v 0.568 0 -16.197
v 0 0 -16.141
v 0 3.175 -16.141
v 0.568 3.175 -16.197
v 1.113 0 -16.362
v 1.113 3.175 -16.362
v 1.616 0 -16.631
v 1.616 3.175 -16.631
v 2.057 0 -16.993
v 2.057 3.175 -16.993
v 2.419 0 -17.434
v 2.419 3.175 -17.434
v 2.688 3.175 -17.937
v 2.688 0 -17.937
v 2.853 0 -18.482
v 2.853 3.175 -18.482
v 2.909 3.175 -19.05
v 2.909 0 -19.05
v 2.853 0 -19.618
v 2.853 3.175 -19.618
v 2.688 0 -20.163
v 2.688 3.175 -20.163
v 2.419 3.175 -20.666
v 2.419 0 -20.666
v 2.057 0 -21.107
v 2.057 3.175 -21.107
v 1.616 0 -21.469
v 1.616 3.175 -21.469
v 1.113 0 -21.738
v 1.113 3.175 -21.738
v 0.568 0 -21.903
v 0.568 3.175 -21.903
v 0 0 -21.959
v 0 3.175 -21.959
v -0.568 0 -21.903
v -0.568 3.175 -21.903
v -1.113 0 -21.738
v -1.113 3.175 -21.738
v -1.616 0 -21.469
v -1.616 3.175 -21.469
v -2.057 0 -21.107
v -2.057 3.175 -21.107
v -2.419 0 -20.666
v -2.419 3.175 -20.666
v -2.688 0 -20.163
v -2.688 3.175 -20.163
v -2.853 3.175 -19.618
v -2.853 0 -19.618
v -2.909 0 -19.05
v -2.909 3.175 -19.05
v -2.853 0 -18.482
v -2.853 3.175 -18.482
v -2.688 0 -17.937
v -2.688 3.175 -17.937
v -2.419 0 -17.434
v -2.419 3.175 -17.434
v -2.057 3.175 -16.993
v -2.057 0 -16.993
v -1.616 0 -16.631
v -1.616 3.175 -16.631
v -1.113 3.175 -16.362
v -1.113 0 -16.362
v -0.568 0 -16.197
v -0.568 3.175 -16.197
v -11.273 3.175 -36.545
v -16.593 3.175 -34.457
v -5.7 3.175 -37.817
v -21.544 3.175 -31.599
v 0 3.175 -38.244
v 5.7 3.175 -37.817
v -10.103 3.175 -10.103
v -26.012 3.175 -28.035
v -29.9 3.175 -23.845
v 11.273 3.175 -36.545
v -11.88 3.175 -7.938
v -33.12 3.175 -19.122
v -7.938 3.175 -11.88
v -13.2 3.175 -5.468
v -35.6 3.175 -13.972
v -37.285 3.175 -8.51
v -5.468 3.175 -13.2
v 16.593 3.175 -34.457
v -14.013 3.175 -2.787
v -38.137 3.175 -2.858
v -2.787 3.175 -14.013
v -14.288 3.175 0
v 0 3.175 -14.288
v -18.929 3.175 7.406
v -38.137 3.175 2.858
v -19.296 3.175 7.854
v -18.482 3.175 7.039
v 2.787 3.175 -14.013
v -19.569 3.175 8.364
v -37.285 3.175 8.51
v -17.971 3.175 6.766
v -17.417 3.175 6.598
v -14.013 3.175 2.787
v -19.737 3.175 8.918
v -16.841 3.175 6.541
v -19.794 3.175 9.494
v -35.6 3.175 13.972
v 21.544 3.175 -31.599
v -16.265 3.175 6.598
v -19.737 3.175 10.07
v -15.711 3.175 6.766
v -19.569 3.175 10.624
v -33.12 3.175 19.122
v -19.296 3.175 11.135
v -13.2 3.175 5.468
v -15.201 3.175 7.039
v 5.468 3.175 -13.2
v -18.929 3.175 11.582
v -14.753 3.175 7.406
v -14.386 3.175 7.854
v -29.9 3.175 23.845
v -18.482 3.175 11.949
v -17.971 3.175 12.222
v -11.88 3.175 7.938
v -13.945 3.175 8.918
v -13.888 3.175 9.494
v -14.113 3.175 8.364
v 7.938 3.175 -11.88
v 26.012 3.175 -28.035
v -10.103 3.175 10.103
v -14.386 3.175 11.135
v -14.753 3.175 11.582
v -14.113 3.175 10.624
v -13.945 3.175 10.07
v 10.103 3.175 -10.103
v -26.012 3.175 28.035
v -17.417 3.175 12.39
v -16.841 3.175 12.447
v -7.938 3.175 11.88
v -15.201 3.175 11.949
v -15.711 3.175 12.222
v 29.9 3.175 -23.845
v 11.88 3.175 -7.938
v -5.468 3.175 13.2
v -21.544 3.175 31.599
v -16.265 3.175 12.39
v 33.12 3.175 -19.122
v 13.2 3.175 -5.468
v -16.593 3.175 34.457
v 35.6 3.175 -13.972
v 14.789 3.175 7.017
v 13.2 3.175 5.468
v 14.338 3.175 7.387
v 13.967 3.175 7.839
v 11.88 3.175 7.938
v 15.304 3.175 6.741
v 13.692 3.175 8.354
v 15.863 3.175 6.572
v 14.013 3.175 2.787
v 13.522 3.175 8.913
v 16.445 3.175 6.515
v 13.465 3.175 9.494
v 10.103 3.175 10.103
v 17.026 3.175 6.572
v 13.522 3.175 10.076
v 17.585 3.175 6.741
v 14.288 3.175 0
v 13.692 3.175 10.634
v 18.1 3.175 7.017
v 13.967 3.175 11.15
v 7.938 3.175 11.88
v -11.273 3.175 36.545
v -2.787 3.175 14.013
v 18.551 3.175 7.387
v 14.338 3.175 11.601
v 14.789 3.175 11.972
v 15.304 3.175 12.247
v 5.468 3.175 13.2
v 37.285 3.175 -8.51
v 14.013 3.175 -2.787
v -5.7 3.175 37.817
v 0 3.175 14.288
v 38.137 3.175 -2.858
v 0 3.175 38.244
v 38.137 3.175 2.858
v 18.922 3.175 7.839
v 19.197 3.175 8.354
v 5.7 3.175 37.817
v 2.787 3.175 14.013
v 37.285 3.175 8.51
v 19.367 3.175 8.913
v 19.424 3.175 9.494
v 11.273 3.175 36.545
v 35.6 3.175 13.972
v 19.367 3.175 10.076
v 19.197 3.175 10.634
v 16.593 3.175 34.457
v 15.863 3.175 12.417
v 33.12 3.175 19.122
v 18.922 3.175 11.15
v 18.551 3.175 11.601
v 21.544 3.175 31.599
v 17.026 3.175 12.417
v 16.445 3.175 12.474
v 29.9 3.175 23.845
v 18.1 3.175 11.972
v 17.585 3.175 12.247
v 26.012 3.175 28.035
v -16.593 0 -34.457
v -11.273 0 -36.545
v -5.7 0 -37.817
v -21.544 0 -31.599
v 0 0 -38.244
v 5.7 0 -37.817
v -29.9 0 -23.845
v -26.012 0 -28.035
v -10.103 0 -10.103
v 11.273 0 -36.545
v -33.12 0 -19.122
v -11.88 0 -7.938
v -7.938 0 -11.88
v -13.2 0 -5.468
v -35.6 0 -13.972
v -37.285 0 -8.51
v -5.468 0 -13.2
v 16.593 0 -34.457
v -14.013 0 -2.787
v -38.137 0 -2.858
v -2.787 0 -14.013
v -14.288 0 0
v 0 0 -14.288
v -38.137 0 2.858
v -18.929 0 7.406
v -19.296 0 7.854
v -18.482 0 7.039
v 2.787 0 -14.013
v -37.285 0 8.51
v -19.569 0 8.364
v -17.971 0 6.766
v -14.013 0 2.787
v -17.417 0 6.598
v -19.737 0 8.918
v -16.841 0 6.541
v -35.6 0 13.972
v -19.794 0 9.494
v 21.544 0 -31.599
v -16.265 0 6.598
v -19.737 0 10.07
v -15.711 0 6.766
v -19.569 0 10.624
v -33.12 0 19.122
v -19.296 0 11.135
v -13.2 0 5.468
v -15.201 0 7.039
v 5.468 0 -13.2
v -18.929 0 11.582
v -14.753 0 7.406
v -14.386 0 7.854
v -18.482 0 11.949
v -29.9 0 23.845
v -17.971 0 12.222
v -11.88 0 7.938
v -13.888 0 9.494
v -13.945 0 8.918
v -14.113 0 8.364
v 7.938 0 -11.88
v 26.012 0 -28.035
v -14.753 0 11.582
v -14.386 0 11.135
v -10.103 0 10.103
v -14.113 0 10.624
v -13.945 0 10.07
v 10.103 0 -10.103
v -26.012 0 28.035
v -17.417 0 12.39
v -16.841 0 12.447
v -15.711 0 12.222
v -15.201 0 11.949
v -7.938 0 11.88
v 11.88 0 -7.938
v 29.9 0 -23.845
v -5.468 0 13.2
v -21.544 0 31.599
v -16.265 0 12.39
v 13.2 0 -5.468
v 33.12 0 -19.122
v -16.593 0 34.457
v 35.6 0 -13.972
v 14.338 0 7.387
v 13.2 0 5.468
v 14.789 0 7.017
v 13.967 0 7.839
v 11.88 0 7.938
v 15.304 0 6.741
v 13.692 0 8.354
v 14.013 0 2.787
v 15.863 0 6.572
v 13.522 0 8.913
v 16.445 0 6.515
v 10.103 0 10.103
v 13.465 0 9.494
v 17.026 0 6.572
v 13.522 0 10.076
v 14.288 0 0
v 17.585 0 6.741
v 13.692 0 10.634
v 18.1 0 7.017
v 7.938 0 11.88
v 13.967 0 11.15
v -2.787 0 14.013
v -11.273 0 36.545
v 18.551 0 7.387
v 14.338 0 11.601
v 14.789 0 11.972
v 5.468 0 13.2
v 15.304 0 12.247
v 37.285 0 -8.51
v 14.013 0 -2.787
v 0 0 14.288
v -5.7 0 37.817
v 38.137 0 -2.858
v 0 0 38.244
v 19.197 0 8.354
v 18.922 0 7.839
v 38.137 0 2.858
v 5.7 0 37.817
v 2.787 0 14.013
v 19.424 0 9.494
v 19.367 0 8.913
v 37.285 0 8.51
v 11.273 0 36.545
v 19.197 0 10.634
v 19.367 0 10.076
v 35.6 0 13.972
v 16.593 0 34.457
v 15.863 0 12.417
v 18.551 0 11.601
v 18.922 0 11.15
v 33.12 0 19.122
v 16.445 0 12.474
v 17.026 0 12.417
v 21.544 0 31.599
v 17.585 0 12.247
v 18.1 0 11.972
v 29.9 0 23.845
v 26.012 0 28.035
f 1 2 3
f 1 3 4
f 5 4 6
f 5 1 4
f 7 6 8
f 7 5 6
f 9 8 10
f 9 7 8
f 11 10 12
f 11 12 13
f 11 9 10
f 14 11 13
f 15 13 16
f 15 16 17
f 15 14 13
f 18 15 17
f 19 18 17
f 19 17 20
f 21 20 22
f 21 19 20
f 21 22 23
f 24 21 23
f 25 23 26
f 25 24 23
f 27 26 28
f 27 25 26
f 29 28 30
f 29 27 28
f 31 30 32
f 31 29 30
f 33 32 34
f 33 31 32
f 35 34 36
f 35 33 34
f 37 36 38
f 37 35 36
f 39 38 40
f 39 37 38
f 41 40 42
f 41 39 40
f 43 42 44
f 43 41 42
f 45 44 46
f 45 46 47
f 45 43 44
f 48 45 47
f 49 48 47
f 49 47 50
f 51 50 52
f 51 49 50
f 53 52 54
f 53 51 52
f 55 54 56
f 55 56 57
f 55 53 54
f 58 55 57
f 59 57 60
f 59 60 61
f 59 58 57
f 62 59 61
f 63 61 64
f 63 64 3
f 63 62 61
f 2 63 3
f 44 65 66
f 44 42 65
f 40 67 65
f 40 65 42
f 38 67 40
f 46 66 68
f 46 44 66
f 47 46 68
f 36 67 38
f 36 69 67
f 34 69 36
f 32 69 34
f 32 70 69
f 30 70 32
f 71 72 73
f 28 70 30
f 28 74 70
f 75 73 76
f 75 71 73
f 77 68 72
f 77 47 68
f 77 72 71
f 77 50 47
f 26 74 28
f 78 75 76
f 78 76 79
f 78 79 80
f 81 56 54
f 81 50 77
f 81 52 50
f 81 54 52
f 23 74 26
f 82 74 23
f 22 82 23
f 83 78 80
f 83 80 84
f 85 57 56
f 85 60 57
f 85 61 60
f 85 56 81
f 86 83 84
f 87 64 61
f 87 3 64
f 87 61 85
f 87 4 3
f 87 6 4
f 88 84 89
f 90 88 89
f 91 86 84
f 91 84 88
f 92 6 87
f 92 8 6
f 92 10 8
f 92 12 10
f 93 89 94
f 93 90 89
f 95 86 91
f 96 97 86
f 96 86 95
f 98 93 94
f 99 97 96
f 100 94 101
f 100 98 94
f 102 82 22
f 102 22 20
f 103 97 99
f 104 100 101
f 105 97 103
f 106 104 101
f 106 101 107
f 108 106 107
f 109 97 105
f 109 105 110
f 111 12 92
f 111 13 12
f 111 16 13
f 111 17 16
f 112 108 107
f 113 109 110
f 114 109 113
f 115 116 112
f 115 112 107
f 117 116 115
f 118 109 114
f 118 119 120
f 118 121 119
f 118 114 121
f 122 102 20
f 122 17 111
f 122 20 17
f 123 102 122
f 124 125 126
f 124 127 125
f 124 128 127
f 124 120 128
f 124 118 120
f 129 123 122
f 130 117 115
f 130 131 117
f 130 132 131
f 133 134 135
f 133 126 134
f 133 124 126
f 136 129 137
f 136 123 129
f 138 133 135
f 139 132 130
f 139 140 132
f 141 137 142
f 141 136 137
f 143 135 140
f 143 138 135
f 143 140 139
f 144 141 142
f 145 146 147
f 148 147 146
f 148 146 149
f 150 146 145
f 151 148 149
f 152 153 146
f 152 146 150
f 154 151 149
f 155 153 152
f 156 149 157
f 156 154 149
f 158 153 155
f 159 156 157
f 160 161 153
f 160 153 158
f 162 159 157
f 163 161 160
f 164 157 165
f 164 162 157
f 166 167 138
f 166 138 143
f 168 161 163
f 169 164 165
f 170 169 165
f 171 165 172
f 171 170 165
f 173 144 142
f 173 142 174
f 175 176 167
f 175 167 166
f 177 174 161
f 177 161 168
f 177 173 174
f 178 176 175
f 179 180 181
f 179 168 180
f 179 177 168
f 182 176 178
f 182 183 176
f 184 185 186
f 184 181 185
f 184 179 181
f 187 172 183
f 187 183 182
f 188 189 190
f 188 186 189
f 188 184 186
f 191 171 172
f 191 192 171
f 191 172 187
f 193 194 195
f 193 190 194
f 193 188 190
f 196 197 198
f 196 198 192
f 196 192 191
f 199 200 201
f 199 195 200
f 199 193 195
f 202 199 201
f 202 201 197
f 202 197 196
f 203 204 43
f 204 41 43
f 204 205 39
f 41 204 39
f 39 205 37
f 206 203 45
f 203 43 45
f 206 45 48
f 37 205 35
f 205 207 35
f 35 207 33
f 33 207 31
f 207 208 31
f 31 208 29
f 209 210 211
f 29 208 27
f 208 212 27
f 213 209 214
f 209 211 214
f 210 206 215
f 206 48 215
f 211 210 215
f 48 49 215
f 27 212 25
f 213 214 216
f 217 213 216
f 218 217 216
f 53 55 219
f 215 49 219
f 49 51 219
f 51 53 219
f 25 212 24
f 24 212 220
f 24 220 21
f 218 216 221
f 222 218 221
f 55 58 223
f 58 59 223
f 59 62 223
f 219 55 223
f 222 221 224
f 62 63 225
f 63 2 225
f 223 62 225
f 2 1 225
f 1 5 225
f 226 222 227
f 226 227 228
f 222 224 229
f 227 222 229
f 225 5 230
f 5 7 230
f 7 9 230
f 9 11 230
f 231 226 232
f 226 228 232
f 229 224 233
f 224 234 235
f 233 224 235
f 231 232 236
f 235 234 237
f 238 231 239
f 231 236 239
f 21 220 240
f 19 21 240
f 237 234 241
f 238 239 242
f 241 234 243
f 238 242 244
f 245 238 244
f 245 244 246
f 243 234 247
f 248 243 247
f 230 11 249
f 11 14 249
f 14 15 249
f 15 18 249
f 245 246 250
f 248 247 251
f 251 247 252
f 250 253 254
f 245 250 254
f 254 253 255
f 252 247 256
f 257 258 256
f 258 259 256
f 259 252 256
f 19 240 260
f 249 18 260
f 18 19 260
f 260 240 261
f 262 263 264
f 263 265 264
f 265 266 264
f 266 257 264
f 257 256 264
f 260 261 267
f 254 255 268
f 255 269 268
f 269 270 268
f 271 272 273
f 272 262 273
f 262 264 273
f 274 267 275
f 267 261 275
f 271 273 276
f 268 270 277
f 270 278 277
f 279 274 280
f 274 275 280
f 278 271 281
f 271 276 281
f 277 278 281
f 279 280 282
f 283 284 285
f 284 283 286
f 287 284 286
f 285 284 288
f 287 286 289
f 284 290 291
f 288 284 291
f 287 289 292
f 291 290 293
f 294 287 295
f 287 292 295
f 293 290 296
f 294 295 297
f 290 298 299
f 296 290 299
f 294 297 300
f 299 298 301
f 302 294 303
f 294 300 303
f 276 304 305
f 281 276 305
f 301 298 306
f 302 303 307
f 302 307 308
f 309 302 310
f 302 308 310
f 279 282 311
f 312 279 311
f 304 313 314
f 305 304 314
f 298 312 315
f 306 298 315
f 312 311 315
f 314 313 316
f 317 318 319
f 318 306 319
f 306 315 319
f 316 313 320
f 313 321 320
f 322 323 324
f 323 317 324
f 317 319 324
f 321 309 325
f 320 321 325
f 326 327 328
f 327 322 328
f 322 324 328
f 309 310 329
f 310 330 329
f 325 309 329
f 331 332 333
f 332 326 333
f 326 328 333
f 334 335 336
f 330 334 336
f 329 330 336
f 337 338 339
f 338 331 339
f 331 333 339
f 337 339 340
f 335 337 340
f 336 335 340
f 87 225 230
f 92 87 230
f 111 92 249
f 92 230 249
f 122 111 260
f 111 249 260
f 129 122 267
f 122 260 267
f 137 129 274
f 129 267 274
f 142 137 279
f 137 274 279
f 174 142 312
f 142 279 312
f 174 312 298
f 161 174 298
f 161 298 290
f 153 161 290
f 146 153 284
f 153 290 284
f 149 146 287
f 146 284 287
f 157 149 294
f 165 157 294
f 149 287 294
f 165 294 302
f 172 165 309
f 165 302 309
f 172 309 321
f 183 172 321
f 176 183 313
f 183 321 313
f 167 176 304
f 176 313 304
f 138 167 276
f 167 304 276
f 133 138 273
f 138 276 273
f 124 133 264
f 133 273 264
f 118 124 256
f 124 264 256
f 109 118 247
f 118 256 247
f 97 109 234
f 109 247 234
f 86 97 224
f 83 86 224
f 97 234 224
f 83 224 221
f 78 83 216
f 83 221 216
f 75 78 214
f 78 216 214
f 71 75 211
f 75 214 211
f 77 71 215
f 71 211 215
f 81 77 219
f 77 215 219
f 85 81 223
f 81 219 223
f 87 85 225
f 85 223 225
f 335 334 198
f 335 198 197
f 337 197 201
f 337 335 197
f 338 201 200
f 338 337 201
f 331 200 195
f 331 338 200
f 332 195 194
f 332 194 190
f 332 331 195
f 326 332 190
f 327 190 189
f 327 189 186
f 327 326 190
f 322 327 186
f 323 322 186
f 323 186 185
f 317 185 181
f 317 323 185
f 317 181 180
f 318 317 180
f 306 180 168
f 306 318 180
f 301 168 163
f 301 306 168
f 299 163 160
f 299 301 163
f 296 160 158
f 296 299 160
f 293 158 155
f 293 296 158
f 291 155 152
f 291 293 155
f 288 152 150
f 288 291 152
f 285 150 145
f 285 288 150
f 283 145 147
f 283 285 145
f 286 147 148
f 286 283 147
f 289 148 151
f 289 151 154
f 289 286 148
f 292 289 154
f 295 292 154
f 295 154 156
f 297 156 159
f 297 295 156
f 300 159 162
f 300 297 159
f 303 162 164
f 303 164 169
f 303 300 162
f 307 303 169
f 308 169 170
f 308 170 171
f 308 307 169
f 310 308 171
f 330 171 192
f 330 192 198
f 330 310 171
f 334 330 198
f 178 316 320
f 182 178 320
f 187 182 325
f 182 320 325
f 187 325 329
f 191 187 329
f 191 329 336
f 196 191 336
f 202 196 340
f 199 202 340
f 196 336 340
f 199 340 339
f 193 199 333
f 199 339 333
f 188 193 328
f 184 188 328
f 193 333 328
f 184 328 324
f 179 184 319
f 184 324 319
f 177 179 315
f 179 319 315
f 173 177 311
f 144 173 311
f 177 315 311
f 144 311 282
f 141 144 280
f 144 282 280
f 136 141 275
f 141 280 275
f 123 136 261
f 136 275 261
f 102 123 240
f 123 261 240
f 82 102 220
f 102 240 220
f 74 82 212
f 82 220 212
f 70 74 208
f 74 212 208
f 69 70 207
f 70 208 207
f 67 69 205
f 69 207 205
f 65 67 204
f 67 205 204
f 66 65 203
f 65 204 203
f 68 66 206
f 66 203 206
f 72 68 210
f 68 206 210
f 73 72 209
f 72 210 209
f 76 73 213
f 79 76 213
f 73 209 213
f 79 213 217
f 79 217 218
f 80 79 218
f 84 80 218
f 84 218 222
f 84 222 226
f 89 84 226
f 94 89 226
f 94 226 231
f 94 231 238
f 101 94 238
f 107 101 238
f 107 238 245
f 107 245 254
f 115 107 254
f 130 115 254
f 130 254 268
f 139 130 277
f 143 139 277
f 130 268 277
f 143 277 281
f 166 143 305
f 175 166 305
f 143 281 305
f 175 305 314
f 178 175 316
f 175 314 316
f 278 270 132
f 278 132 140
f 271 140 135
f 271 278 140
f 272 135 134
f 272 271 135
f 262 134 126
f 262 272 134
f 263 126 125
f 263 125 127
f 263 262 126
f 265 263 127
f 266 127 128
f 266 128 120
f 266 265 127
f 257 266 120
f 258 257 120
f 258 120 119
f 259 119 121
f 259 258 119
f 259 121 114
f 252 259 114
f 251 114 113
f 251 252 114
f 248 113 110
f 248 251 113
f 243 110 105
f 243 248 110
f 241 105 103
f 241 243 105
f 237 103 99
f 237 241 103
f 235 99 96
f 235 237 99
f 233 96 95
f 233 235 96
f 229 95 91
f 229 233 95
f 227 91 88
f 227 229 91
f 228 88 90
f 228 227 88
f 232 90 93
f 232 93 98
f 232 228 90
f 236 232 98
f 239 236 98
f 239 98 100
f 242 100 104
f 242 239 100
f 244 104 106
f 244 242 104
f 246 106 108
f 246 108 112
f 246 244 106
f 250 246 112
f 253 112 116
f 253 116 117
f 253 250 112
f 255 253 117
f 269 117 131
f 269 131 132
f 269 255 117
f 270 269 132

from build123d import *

# Parameters (mm, degrees)
SKETCH1_R           = 38.243875115
SKETCH1_R_2         = 12.860433797
SKETCH1_R_3         = 2.952880618
SKETCH1_R_4         = 2.979621757
SKETCH1_R_5         = 2.909102137
BOSS_EXTRUDE1_DEPTH = 3.175
SKETCH2_R           = 14.2875
CUT_EXTRUDE1_DEPTH  = 3.175


with BuildPart() as part:
    # Sketch1 → Boss-Extrude1 (new body)
    with BuildSketch(Plane(origin=(0, 0, 0), x_dir=(1, 0, 0), z_dir=(0, 1, 0))):
        with Locations(Location((0, 0, 0), (0, 0, 270))):
            Circle(SKETCH1_R)
        with Locations(Location((0, 0, 0), (0, 0, 270))):
            Circle(SKETCH1_R_2, mode=Mode.SUBTRACT)
        with Locations(Location((-16.841170726, -9.494245367, 0), (0, 0, 270))):
            Circle(SKETCH1_R_3, mode=Mode.SUBTRACT)
        with Locations(Location((16.444515355, -9.494245367, 0), (0, 0, 270))):
            Circle(SKETCH1_R_4, mode=Mode.SUBTRACT)
        with Locations(Location((0, 19.05, 0), (0, 0, 270))):
            Circle(SKETCH1_R_5, mode=Mode.SUBTRACT)
    extrude(amount=BOSS_EXTRUDE1_DEPTH)

    # Sketch2 → Cut-Extrude1 (cut)
    with BuildSketch(Plane.XZ):
        with Locations(Location((0, 0, 0), (0, 0, 270))):
            Circle(SKETCH2_R)
    extrude(amount=-CUT_EXTRUDE1_DEPTH, mode=Mode.SUBTRACT)


solid = part.part
